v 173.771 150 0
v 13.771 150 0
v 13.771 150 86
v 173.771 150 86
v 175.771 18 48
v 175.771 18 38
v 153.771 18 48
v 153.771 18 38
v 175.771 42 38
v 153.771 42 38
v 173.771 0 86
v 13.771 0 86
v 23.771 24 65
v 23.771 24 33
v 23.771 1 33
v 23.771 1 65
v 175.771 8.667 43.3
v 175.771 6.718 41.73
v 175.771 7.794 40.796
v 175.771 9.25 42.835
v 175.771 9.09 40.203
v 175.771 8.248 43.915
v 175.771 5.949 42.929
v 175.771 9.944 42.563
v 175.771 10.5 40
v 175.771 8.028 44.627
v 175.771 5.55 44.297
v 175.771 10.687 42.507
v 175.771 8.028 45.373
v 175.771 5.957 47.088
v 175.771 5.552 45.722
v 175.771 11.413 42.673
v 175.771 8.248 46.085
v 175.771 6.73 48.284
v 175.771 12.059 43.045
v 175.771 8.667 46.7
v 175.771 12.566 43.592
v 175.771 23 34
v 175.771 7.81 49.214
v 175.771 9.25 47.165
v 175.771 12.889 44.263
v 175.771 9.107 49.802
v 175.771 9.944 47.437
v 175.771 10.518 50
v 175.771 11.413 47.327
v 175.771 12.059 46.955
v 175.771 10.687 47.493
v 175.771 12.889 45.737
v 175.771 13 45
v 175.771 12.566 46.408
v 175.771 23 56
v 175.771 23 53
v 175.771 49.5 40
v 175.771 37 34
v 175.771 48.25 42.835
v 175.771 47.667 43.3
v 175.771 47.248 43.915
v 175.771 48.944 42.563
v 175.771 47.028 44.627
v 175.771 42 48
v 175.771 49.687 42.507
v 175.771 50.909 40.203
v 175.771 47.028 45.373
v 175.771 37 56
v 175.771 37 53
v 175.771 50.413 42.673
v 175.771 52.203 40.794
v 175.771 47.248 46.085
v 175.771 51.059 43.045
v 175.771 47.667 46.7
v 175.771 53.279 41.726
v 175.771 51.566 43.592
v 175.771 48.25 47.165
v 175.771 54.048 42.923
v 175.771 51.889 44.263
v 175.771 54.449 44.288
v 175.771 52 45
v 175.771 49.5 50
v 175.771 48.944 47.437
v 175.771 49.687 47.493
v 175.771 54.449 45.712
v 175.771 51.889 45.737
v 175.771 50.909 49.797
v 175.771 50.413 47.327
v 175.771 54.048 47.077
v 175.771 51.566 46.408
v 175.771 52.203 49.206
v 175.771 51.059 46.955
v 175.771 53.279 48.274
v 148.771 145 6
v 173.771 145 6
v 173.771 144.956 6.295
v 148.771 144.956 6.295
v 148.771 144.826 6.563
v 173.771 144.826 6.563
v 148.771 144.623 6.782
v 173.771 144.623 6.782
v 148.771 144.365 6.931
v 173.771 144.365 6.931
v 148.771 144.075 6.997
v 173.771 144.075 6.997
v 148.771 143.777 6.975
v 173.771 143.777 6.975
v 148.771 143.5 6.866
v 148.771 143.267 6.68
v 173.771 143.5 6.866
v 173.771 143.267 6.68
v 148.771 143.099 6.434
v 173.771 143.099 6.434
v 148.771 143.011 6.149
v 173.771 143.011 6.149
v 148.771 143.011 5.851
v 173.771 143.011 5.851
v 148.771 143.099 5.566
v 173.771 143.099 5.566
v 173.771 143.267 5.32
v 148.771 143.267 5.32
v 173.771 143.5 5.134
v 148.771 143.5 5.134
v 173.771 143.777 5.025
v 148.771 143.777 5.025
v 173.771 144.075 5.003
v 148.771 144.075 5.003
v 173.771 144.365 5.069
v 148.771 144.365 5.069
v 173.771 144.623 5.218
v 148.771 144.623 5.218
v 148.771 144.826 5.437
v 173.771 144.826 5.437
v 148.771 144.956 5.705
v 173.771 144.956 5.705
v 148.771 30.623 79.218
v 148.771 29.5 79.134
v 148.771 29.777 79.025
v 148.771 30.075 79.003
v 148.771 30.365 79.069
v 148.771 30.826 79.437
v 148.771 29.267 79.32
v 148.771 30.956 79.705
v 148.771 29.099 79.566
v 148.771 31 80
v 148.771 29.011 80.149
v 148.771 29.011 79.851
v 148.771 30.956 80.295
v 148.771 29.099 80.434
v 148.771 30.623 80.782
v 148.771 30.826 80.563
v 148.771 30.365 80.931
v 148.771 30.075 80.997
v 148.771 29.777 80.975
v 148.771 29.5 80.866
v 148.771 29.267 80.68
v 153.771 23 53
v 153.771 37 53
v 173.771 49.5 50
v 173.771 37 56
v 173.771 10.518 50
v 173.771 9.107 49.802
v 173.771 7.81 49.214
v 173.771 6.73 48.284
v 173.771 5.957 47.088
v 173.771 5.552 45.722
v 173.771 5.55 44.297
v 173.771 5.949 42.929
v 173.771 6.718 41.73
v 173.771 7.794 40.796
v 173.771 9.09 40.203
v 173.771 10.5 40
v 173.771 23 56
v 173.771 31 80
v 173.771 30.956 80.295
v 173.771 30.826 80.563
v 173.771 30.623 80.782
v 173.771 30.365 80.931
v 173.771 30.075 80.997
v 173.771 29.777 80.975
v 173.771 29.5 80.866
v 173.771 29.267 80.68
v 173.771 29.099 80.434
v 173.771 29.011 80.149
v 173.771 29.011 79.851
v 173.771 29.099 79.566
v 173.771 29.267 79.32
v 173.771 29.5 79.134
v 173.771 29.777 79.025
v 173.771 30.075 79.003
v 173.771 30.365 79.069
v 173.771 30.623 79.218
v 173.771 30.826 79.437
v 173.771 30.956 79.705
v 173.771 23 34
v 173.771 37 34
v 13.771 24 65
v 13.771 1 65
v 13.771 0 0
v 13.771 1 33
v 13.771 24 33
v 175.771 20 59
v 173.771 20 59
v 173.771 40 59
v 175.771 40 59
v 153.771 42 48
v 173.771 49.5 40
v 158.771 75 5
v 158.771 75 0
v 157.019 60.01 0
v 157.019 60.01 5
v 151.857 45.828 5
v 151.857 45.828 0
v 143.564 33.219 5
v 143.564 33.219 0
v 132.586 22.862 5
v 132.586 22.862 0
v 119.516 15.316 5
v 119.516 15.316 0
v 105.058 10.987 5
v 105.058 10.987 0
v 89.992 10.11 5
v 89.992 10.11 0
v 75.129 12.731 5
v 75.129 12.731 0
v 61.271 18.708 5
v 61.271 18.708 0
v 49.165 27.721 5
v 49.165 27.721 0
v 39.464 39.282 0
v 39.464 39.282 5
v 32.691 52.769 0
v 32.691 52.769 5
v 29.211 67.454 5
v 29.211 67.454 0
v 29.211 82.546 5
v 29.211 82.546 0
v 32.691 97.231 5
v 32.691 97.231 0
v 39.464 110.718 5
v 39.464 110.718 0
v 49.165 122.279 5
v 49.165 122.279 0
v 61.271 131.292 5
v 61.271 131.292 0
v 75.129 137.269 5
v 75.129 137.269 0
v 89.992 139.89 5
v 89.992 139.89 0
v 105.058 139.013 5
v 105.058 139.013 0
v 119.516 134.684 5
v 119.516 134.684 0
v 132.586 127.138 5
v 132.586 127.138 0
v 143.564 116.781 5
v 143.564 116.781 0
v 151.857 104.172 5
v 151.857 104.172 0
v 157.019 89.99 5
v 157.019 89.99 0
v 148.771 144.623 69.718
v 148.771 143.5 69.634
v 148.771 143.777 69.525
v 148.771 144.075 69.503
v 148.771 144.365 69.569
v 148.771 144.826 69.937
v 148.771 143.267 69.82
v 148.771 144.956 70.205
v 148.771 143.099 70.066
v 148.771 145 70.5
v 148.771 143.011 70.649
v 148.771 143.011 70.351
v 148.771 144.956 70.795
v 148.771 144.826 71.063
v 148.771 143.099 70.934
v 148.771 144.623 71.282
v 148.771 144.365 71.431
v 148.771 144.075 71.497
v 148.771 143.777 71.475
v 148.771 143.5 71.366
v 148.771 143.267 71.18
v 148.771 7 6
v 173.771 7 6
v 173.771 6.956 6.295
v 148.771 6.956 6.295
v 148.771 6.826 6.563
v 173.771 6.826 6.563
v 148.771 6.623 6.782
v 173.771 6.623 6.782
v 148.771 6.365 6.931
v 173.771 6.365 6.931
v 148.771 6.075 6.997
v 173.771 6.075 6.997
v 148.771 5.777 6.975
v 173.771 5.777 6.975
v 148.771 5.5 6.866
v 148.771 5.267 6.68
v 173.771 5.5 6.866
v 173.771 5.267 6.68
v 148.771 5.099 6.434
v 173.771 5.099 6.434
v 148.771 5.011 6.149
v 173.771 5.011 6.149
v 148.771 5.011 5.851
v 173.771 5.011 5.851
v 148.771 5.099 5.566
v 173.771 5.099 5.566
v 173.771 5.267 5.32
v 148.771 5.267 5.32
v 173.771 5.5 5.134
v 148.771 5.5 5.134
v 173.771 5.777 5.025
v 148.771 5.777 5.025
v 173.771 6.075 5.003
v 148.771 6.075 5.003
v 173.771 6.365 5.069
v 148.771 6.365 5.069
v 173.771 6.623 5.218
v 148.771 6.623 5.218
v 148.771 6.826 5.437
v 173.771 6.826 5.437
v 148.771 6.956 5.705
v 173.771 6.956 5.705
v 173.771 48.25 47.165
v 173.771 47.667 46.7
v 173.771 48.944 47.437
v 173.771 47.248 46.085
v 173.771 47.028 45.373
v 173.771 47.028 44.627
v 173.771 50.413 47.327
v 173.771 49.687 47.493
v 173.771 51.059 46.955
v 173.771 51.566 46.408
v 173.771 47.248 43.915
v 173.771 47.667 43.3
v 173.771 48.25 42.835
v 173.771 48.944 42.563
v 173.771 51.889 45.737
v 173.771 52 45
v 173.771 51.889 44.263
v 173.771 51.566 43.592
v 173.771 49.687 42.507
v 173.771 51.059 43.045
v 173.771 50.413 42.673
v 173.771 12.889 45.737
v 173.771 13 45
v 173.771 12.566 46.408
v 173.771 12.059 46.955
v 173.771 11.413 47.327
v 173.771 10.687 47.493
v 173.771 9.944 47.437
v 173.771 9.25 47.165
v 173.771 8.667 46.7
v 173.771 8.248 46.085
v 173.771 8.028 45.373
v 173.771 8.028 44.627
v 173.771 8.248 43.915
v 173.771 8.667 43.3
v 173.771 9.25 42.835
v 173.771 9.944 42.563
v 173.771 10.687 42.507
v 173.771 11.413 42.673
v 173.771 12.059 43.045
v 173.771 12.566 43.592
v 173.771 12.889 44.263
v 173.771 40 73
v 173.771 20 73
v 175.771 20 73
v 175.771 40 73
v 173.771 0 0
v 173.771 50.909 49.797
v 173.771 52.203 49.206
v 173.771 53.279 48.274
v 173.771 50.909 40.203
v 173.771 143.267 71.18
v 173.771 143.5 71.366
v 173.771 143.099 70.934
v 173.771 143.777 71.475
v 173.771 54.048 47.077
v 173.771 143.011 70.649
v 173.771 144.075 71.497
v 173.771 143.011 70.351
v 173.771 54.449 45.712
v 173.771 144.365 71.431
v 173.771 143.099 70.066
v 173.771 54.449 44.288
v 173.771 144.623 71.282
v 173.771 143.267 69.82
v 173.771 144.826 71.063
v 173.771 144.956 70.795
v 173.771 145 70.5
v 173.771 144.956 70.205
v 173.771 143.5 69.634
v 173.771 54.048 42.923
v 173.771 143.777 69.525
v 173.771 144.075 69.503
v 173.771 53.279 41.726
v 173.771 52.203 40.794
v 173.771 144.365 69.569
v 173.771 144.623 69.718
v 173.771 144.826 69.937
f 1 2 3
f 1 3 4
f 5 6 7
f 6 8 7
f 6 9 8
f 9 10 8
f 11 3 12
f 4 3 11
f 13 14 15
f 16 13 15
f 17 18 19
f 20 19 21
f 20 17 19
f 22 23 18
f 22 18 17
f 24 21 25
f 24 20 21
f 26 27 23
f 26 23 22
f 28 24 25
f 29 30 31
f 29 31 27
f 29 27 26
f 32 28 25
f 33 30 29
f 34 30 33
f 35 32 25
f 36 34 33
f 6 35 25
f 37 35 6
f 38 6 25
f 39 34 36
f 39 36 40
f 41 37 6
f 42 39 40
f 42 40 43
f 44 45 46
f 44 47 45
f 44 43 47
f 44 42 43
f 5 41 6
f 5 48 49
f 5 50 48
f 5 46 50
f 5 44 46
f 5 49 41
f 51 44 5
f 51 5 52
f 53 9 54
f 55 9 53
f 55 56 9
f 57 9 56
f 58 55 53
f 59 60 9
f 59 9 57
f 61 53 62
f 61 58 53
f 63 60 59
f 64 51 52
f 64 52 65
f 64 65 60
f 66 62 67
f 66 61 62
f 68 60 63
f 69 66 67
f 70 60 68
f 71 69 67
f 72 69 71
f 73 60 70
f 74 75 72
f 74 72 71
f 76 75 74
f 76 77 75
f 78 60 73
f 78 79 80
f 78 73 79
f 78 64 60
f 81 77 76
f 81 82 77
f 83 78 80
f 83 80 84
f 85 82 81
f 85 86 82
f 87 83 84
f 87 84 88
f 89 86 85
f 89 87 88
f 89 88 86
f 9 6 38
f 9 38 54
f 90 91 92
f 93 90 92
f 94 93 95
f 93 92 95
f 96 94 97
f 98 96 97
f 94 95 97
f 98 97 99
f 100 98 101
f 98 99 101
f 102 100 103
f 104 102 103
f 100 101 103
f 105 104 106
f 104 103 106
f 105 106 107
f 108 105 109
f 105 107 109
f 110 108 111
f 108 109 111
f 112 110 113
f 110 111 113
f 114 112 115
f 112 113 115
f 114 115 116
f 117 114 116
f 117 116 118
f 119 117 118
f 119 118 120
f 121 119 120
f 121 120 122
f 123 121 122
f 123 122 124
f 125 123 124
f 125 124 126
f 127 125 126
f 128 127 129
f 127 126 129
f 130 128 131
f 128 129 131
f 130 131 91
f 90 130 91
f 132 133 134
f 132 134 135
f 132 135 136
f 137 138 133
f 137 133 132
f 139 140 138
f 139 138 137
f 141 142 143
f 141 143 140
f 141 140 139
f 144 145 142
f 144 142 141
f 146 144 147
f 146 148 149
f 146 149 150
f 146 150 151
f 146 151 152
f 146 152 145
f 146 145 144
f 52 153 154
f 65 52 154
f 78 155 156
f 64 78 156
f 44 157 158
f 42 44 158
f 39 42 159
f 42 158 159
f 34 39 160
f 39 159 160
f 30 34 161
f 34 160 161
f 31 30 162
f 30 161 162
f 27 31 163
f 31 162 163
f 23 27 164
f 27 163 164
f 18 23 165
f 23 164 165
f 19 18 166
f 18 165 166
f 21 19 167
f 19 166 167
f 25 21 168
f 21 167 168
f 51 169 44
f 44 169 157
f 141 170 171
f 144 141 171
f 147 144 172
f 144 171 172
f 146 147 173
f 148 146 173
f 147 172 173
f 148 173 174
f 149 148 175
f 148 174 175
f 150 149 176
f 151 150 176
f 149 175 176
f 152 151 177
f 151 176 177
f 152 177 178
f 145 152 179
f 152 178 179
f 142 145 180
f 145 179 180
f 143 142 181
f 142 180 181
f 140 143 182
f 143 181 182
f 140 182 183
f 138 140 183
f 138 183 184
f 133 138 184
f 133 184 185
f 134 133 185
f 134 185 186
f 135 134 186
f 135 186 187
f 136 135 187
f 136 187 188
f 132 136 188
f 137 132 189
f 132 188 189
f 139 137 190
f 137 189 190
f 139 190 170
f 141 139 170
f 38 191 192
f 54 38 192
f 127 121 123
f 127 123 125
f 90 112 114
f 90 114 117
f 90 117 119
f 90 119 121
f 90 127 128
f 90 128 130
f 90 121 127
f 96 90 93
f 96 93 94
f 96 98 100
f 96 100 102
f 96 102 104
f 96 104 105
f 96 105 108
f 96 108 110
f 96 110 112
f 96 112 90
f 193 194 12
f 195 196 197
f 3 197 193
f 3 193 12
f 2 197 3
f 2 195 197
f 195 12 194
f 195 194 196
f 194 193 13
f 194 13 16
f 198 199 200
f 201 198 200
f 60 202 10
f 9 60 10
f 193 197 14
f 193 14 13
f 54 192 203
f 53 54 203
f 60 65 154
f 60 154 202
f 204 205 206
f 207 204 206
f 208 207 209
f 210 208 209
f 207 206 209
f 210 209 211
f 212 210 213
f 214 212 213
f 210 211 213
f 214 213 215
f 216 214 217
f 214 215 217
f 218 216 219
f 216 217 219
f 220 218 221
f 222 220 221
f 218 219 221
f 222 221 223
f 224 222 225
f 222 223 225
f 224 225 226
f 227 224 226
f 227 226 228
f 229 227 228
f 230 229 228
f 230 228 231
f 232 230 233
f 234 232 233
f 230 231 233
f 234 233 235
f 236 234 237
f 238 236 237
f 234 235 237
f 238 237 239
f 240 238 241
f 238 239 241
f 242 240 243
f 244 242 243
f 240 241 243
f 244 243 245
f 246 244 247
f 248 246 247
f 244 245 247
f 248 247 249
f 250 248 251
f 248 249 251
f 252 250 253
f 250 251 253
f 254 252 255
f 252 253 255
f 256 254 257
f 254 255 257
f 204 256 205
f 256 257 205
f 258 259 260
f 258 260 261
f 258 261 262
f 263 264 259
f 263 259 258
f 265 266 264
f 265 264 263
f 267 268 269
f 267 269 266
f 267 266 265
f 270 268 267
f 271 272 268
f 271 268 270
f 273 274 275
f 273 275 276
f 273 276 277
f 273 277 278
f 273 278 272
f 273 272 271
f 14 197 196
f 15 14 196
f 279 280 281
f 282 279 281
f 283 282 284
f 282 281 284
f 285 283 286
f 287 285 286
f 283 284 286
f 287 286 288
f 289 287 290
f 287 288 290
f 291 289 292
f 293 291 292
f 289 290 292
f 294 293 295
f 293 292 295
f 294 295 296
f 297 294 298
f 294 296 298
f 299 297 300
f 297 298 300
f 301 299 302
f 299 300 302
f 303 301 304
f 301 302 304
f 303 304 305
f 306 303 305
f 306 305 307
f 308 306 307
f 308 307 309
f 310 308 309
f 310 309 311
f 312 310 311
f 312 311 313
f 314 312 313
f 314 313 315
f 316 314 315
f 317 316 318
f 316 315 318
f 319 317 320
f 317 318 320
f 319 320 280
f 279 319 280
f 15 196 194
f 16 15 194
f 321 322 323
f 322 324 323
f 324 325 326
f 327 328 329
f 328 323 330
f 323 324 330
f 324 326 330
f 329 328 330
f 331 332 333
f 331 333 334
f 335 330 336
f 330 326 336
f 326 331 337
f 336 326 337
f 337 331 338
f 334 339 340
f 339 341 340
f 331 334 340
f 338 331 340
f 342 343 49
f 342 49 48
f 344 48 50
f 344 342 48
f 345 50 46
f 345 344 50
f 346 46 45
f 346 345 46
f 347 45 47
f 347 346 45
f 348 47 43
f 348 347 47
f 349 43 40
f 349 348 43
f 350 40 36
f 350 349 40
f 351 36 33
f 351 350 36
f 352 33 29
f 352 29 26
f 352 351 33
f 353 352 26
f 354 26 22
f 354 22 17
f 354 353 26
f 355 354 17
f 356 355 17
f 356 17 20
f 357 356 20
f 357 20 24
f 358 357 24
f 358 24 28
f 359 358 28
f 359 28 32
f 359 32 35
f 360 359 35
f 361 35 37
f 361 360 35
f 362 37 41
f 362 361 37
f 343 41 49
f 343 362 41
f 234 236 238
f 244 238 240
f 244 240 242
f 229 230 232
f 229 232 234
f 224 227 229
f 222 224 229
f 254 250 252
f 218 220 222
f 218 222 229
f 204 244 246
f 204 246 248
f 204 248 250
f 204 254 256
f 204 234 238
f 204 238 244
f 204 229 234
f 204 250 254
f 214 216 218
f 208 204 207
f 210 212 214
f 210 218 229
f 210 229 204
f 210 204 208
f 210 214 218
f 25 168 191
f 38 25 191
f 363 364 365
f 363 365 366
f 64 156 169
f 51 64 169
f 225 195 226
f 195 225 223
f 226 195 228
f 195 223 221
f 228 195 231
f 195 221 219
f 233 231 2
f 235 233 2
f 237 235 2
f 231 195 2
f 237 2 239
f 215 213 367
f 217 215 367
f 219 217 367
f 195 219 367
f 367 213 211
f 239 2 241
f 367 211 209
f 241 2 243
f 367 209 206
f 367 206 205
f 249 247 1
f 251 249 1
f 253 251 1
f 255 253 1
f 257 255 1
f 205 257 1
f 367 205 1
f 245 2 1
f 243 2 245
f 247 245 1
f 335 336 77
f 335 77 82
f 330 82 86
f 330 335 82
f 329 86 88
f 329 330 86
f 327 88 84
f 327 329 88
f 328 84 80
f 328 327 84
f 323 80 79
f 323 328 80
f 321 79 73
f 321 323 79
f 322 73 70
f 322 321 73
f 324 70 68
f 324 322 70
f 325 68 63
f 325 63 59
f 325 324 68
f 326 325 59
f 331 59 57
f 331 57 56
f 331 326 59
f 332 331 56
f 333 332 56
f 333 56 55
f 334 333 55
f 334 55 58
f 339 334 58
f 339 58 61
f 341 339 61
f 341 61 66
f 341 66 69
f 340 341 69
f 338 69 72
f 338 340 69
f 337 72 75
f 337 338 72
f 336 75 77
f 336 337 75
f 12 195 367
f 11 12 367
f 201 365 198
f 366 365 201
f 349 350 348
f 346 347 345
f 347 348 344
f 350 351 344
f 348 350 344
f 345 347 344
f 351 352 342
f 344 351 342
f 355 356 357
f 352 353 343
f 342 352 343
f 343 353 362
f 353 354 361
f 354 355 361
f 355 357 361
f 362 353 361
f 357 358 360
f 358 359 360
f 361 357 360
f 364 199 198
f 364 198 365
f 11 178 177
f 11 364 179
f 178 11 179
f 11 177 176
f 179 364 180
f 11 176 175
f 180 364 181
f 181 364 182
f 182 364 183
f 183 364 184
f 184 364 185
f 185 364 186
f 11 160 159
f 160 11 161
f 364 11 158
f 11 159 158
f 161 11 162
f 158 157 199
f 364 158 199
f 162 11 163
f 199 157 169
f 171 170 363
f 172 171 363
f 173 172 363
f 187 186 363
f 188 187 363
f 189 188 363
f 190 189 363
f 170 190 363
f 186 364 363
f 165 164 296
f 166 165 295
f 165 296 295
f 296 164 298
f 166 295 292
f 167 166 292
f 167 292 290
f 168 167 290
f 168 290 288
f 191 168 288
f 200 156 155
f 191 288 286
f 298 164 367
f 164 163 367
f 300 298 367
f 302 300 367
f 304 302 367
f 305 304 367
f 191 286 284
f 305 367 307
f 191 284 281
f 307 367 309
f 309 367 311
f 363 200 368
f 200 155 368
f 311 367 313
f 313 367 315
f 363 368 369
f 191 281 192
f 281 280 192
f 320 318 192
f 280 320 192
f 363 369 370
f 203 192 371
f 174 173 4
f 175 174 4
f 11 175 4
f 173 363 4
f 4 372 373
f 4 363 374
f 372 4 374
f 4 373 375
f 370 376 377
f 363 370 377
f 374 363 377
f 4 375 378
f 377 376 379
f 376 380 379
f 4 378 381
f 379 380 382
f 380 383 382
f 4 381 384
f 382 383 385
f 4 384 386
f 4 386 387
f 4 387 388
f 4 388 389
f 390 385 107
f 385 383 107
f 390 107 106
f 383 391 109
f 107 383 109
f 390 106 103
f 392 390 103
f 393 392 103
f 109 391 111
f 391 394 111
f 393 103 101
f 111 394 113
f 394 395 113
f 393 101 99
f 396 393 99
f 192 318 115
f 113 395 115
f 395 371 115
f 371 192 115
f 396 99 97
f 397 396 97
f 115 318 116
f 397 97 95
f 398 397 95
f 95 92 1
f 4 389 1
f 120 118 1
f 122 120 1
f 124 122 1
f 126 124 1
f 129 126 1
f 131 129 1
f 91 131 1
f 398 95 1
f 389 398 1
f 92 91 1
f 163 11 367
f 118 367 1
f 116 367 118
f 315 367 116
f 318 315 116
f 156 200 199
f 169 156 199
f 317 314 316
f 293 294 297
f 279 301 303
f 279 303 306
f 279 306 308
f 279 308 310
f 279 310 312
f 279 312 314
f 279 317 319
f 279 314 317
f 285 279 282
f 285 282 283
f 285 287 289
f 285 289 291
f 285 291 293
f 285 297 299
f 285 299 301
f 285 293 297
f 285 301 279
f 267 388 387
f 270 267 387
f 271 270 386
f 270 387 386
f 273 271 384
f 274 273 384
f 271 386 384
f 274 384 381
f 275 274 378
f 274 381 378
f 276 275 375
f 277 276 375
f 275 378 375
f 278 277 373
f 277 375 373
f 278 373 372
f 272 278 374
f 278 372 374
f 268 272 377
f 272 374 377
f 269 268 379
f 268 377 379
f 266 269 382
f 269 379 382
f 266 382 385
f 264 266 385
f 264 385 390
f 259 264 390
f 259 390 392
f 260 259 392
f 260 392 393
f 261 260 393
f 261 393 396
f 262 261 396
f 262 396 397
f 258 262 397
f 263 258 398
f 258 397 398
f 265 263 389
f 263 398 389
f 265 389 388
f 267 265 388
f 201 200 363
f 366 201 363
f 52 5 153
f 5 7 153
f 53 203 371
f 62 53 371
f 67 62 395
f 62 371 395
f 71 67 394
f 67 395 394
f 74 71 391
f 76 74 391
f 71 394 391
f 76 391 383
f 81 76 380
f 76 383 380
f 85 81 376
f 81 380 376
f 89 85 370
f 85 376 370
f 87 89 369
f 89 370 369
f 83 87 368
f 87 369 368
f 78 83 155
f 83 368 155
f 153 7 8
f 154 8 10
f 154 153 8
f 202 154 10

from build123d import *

# Parameters (mm, degrees)
F0_W      = 160
F0_H      = 150
F1_DEPTH  = 86
F3_DEPTH  = 20
F4_W      = 20
F4_H      = 14
F5_DEPTH  = 2
F6_R      = 2.5
F7_DEPTH  = 2
F8_R      = 1
F9_DEPTH  = 25
F10_W     = 23
F10_H     = 32
F11_DEPTH = 10
F12_R     = 65
F13_DEPTH = 5


with BuildPart() as f1:
    # F0 (on Top) → F1 (new body)
    with BuildSketch(Plane.XY):
        with Locations((93.771139, 75)):
            Rectangle(F0_W, F0_H)
    extrude(amount=F1_DEPTH)

    # F2 (on face) → F3 (cut)
    with BuildSketch(Plane.YZ.offset(173.771139)):
        Polygon((37, 53), (23, 53), (18, 48), (18, 38), (42, 38), (42, 48), align=None)
    extrude(amount=-F3_DEPTH, mode=Mode.SUBTRACT)

    # F4 (on face) → F5 (join)
    with BuildSketch(Plane.YZ.offset(173.771139)):
        with Locations((30, 66)):
            Rectangle(F4_W, F4_H)
    extrude(amount=F5_DEPTH)

    # F6 (on face) → F7 (join)
    with BuildSketch(Plane.YZ.offset(173.771139)):
        with BuildLine():
            Line((23, 56), (10.518483, 49.999966))
            ThreePointArc((10.518483, 49.999966), (5.500009, 45.009242), (10.5, 40))
            Line((10.5, 40), (23, 34))
            Line((23, 34), (37, 34))
            Line((37, 34), (49.5, 40))
            ThreePointArc((49.5, 40), (54.5, 45), (49.5, 50))
            Line((49.5, 50), (37, 56))
            Line((37, 56), (23, 56))
        make_face()
        with Locations((10.5, 45)):
            Circle(F6_R, mode=Mode.SUBTRACT)
        Polygon((42, 38), (18, 38), (18, 48), (23, 53), (37, 53), (42, 48), align=None, mode=Mode.SUBTRACT)
        with Locations((49.5, 45)):
            Circle(F6_R, mode=Mode.SUBTRACT)
    extrude(amount=F7_DEPTH)

    # F8 (on face) → F9 (cut)
    with BuildSketch(Plane.YZ.offset(173.771139)):
        with Locations((30, 80)):
            Circle(F8_R)
        with Locations((6, 6)):
            Circle(F8_R)
        with Locations((144, 70.5)):
            Circle(F8_R)
        with Locations((144, 6)):
            Circle(F8_R)
    extrude(amount=-F9_DEPTH, mode=Mode.SUBTRACT)

    # F10 (on face) → F11 (cut)
    with BuildSketch(Plane(origin=(13.771139, 0, 0), x_dir=(0, -1, 0), z_dir=(-1, 0, 0))):
        with Locations((-12.5, 49)):
            Rectangle(F10_W, F10_H)
    extrude(amount=-F11_DEPTH, mode=Mode.SUBTRACT)

    # F12 (on face) → F13 (cut)
    with BuildSketch(Plane(origin=(0, 0, 0), x_dir=(1, 0, 0), z_dir=(0, 0, -1))):
        with Locations((93.771139, -75)):
            Circle(F12_R)
    extrude(amount=-F13_DEPTH, mode=Mode.SUBTRACT)


solid = f1.part
